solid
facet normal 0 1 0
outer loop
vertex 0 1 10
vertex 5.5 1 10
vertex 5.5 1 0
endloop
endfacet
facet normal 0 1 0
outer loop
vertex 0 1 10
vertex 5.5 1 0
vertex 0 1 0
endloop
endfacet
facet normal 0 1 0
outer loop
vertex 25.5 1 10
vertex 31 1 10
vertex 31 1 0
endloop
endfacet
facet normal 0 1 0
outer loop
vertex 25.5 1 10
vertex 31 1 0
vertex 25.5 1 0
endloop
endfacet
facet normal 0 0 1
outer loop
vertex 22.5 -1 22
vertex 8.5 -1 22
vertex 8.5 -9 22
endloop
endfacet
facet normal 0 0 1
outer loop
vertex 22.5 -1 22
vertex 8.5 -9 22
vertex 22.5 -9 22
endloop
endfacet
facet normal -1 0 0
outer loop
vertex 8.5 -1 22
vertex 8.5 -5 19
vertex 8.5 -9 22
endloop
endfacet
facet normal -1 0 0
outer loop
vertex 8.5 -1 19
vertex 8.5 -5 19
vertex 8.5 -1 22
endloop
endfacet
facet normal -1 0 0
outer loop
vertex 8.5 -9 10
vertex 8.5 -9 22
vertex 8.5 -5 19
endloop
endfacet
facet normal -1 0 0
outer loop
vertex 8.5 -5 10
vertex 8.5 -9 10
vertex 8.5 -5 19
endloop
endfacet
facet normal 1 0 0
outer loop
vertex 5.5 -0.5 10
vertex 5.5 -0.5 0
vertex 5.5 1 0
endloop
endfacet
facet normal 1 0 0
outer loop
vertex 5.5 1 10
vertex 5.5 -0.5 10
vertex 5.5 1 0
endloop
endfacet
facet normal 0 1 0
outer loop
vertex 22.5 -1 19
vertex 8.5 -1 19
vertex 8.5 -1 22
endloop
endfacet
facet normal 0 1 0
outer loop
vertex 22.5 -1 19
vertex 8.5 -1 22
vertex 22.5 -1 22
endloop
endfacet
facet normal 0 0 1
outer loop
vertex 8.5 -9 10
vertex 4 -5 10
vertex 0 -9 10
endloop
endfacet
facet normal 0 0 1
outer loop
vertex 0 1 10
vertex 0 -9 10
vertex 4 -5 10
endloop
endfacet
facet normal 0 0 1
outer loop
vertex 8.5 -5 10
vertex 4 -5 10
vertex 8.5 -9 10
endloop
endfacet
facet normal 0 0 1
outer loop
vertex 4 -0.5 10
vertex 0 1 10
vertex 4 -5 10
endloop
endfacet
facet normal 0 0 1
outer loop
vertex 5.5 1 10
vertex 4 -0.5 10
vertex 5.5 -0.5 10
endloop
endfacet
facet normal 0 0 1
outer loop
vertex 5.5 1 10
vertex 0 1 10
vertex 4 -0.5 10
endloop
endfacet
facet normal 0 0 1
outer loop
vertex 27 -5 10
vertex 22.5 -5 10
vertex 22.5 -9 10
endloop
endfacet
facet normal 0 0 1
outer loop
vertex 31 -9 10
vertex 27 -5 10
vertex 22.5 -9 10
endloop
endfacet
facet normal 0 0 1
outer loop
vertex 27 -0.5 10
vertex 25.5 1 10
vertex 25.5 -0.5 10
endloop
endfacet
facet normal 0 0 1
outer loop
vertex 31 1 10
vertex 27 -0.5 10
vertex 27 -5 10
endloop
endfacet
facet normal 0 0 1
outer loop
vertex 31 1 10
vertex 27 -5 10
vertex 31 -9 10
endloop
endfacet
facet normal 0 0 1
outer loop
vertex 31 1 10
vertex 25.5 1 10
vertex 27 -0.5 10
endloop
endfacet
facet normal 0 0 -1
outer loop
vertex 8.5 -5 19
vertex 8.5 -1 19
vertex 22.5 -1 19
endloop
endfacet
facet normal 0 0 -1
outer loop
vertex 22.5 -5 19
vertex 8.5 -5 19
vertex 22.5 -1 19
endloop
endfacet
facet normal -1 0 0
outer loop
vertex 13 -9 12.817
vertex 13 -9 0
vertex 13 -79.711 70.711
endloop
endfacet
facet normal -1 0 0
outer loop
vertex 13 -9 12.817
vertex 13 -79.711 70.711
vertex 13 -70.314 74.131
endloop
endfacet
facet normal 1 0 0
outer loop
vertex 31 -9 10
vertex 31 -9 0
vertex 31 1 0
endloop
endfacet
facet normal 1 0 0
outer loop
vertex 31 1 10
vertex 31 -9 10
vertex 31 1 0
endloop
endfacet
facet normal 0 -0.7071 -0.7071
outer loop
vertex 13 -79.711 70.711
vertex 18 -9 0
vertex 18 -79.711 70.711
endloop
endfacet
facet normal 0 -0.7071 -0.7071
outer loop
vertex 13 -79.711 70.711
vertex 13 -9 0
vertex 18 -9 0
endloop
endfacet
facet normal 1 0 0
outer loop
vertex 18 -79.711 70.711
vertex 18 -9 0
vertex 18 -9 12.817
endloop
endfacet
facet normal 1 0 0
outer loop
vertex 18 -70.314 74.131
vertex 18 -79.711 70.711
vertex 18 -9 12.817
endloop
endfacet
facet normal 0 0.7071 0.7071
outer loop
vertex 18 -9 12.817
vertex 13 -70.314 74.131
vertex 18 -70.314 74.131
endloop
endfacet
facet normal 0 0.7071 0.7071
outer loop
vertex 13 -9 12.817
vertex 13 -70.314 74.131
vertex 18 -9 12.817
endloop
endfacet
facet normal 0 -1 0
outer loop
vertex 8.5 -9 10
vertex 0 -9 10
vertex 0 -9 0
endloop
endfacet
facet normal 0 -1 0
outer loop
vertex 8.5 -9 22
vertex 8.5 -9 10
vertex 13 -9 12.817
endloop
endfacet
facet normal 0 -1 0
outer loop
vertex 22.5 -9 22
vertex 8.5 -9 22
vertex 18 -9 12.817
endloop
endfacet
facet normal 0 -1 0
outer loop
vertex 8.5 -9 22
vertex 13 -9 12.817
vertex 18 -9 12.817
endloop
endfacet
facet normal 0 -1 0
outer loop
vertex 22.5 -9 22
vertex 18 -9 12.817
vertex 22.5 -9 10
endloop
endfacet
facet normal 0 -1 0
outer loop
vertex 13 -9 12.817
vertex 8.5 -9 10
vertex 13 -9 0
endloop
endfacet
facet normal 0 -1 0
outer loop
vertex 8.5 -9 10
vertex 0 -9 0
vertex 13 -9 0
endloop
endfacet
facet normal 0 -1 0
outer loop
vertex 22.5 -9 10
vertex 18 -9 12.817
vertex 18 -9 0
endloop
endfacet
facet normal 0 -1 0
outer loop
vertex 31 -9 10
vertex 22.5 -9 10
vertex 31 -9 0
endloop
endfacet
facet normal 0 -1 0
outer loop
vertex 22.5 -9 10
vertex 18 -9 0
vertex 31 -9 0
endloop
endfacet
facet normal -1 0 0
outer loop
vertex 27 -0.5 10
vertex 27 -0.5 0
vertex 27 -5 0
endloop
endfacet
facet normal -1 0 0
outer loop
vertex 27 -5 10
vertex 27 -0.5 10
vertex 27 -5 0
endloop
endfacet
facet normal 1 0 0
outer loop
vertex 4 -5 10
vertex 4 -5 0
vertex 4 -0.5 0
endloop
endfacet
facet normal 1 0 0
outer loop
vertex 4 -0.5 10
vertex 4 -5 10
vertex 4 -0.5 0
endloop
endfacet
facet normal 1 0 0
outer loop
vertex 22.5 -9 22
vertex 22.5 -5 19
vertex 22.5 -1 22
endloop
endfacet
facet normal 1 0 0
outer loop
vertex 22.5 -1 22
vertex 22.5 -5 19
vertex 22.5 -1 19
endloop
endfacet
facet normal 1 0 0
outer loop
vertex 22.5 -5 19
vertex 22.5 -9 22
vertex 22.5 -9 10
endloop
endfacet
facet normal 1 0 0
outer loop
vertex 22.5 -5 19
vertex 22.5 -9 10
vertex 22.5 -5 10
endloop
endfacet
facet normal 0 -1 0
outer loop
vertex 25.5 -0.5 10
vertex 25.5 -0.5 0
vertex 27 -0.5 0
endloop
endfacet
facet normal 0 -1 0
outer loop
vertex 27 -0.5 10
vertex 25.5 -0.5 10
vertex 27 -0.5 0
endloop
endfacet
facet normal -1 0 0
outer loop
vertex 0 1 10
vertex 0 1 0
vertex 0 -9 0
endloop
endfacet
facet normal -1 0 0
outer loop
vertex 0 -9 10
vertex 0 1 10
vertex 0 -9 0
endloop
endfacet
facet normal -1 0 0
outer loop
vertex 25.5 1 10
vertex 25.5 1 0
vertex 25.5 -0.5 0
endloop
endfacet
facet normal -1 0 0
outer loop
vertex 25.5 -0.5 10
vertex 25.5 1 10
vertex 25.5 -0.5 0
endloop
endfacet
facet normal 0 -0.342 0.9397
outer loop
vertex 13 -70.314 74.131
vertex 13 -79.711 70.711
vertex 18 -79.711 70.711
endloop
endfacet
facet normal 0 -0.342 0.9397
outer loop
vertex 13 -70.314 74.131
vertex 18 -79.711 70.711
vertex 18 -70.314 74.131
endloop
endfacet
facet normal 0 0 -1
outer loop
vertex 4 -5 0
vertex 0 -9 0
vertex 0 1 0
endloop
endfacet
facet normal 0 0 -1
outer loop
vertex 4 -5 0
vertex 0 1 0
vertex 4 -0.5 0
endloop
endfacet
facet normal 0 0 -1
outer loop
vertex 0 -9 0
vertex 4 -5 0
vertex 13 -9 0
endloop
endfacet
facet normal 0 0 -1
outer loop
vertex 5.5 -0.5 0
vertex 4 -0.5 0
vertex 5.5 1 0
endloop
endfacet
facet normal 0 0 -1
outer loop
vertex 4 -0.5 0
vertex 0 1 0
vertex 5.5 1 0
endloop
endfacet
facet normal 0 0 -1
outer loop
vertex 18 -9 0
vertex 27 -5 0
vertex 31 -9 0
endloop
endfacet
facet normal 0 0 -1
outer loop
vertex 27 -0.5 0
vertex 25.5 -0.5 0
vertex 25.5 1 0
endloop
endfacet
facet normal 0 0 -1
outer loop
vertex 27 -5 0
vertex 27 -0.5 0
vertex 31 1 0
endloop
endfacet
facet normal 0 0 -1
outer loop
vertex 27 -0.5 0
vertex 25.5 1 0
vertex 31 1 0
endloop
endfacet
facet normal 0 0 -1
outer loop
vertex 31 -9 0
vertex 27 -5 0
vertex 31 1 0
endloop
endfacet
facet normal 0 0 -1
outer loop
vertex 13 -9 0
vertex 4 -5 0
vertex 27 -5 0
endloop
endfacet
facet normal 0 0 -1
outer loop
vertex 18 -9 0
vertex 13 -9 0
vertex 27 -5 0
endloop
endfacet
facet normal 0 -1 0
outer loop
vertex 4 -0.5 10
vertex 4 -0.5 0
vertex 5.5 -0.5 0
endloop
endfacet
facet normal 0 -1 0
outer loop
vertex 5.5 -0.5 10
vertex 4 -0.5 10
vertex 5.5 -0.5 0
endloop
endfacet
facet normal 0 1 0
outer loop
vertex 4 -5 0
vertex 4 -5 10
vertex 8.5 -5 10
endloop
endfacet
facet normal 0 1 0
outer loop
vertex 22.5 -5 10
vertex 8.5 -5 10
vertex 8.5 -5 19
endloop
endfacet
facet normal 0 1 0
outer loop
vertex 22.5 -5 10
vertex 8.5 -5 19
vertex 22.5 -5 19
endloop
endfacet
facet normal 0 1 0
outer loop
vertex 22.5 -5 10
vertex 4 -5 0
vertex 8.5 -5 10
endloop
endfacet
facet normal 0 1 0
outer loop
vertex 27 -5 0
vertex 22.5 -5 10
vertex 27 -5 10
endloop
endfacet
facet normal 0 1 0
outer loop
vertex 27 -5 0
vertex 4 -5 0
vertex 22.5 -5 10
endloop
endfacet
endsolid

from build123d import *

# Parameters (mm, degrees)
BOSS_EXTRUDE1_DEPTH  = 10
BOSS_EXTRUDE2_DEPTH  = 2.5
SKETCH9_W            = 14
SKETCH9_H            = 9
BOSS_EXTRUDE11_DEPTH = 4
SKETCH10_W           = 14
SKETCH10_H           = 8
BOSS_EXTRUDE12_DEPTH = 3


with BuildPart() as part:
    # Sketch1 → Boss-Extrude1 (new body)
    with BuildSketch(Plane.XY):
        Polygon((0, 1), (0, 0), (0, -9), (15.5, -9), (15.5, -5), (4, -5), (4, -0.5), (5.5, -0.5), (5.5, 1), align=None)
        Polygon((15.5, -5), (15.5, -9), (31, -9), (31, 0), (31, 1), (25.5, 1), (25.5, -0.5), (27, -0.5), (27, -5), align=None)
    extrude(amount=BOSS_EXTRUDE1_DEPTH)

    # Sketch2 → Boss-Extrude2 (add, symmetric)
    with BuildSketch(Plane.ZY.offset(-15.5)):
        Polygon((0, -9), (70.710678119, -79.710678119), (74.130879552, -70.313751911), (12.817127641, -9), align=None)
    extrude(amount=BOSS_EXTRUDE2_DEPTH, both=True)

    # Sketch9 → Boss-Extrude11 (add)
    with BuildSketch(Plane(origin=(0, -9, 0), x_dir=(1, 0, 0), z_dir=(0, 1, 0))):
        with Locations((15.5, -14.5)):
            Rectangle(SKETCH9_W, SKETCH9_H)
    extrude(amount=BOSS_EXTRUDE11_DEPTH)

    # Sketch10 → Boss-Extrude12 (add)
    with BuildSketch(Plane.XY.offset(19)):
        with Locations((15.5, -5)):
            Rectangle(SKETCH10_W, SKETCH10_H)
    extrude(amount=BOSS_EXTRUDE12_DEPTH)


solid = part.part
